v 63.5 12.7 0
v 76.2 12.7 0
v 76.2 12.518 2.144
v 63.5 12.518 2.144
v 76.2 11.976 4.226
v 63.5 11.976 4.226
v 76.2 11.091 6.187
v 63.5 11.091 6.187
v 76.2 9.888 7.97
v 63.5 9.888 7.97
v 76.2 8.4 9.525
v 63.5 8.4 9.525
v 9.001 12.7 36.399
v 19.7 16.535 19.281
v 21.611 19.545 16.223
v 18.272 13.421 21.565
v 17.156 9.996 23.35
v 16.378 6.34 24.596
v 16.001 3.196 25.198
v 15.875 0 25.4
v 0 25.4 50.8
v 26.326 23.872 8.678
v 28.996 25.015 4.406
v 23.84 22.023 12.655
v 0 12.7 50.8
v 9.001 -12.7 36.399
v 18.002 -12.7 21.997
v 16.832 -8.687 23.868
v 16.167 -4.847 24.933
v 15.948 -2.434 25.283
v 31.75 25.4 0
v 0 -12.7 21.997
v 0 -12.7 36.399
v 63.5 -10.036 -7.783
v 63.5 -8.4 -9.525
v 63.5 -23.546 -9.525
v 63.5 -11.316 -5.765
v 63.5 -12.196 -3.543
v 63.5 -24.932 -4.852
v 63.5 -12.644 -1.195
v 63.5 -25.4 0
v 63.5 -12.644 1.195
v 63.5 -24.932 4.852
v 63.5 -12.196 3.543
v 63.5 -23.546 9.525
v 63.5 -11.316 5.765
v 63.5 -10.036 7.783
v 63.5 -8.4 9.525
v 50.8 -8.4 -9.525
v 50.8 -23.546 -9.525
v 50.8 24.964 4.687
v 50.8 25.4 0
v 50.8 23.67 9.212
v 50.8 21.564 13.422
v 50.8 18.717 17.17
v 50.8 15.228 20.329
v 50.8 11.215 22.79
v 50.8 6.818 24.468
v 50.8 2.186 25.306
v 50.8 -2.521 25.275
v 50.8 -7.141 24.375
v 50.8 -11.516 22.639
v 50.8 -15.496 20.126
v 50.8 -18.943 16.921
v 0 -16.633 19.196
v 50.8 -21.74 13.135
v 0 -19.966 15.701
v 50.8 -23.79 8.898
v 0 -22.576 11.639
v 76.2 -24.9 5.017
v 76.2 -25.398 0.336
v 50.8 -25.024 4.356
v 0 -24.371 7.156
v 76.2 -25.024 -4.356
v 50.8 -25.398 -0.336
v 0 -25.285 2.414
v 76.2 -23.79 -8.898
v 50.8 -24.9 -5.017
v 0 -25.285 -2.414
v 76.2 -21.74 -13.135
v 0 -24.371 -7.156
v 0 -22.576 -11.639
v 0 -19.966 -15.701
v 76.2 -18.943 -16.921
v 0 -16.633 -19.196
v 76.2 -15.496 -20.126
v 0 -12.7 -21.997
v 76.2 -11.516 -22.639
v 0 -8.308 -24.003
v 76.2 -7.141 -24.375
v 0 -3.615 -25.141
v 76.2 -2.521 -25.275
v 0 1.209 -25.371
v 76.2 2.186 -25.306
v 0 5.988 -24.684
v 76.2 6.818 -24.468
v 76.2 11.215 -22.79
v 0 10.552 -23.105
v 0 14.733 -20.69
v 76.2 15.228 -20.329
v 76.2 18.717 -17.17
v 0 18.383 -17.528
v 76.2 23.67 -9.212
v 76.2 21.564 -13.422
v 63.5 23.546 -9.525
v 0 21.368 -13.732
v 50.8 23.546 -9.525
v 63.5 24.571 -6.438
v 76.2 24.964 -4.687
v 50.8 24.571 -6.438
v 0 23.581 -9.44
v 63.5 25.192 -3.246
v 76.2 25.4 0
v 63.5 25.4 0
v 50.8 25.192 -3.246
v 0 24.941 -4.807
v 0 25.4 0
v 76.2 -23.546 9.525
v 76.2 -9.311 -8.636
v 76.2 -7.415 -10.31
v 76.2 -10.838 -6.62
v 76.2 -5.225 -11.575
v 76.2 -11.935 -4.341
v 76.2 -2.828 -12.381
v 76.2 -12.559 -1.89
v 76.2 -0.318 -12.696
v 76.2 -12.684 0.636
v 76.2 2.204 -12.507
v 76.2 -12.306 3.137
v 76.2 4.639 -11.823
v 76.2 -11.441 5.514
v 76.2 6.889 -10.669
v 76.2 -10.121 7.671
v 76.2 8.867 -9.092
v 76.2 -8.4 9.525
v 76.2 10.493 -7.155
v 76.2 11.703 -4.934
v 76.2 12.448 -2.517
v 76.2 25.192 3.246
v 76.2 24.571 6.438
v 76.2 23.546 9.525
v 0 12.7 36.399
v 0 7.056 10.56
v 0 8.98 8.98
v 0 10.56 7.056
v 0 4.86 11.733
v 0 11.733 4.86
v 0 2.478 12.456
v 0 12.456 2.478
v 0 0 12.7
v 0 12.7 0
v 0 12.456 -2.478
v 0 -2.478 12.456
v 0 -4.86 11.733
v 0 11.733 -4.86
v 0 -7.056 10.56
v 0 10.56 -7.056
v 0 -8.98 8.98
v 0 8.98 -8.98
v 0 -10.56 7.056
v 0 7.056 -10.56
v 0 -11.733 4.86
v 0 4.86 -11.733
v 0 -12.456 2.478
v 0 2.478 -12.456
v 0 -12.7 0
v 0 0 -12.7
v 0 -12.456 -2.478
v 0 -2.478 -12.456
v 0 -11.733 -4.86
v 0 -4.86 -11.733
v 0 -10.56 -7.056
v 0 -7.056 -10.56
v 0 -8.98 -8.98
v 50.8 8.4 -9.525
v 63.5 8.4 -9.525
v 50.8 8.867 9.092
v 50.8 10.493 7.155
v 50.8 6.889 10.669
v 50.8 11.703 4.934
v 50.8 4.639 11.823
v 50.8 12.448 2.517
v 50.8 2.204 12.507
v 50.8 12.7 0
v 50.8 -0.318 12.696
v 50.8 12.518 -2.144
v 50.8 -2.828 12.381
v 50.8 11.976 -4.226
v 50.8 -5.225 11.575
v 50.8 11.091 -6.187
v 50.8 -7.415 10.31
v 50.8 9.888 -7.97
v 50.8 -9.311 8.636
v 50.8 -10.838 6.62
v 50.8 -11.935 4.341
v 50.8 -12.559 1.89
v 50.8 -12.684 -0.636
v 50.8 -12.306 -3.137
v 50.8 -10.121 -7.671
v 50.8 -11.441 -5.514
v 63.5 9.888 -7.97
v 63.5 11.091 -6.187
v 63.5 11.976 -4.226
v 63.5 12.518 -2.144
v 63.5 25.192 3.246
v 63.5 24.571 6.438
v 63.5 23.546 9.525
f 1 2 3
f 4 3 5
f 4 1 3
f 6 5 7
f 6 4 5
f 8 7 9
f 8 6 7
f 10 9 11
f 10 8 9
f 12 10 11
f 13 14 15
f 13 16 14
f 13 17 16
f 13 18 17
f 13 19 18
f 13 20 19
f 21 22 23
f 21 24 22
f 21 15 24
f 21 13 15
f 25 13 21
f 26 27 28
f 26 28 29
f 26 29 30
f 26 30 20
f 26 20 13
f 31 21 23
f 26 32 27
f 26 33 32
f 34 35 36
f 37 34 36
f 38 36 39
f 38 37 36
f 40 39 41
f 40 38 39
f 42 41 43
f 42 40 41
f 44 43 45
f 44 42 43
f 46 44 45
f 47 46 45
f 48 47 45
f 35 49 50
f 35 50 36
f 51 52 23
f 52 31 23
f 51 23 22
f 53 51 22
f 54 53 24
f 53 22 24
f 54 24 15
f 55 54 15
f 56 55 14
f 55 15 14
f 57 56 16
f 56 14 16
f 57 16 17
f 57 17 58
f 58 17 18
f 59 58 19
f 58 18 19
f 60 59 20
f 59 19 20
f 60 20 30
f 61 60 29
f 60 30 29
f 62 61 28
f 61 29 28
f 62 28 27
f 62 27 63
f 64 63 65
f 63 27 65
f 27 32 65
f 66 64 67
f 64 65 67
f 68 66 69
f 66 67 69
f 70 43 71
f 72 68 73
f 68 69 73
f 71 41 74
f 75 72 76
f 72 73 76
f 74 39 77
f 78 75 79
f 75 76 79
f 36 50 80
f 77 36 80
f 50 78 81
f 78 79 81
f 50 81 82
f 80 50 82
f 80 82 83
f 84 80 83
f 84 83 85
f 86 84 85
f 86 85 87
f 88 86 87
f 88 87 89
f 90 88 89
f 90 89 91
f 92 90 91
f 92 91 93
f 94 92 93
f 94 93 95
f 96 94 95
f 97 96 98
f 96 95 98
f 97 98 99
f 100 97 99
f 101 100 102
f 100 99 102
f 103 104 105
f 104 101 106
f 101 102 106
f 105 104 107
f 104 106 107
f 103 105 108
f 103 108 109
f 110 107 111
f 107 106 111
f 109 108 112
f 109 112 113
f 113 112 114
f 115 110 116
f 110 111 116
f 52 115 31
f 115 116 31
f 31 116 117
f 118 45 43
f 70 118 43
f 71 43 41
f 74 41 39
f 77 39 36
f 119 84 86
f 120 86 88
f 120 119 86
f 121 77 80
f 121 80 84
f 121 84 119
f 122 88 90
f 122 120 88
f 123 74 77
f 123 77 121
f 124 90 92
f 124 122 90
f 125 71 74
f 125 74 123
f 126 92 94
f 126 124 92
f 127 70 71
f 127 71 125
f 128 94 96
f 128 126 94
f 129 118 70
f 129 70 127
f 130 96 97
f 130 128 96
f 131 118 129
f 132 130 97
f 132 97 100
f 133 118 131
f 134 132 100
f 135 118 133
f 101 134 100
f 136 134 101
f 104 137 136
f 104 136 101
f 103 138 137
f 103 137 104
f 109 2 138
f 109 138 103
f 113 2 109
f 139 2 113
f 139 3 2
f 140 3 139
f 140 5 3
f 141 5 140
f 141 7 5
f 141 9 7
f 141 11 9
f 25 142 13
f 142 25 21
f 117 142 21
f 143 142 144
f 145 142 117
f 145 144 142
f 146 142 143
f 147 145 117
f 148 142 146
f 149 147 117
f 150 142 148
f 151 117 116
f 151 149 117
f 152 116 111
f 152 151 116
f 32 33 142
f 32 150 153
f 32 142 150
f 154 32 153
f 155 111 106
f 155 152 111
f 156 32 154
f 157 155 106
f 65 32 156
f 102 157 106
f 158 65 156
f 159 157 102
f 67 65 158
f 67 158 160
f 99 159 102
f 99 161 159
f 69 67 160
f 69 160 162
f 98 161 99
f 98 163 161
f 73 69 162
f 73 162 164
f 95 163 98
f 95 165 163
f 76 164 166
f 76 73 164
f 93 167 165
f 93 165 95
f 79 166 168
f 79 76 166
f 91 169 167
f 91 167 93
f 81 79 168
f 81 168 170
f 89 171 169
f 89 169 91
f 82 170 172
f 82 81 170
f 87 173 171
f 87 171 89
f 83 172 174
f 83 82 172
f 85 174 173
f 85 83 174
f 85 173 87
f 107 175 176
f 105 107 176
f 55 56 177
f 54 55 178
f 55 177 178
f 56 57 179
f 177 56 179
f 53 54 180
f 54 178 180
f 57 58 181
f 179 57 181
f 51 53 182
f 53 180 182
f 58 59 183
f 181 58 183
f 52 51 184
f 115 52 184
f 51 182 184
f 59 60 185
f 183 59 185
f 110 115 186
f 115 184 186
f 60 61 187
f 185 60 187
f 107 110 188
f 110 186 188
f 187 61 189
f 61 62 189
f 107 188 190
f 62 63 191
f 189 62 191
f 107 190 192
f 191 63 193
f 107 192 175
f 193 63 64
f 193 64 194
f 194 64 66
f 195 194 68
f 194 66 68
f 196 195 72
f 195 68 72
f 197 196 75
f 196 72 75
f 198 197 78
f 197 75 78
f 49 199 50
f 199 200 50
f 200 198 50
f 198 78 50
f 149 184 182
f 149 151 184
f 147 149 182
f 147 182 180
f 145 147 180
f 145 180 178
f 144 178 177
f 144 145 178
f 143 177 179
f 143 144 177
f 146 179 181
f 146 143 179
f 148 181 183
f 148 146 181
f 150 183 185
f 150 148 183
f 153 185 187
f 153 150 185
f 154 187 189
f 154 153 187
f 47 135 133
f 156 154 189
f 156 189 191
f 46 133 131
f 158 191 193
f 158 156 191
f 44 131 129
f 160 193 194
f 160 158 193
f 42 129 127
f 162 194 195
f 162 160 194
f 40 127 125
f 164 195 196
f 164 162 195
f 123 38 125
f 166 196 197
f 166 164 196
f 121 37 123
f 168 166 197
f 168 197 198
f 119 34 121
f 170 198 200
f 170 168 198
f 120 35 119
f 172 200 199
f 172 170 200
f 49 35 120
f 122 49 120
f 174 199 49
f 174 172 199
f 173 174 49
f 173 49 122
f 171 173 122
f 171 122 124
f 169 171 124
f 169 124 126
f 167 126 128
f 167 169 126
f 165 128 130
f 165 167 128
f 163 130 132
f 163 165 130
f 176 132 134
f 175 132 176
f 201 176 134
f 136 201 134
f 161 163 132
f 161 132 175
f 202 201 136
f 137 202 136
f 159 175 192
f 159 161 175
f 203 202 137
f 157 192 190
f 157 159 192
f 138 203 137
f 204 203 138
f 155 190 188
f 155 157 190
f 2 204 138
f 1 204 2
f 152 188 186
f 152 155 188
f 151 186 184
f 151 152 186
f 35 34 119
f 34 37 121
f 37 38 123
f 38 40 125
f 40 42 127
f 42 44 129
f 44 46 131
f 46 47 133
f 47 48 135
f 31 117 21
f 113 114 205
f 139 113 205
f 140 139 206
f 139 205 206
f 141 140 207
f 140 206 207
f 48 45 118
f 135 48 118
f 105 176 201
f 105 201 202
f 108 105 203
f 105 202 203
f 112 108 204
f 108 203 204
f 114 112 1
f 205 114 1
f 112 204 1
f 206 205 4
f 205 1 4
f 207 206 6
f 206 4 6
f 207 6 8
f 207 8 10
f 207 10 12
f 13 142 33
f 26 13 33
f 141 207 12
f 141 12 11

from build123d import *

# Parameters (mm, degrees)
F0_R          = 25.4
F0_R_2        = 12.7
F1_DEPTH      = 76.2
F3_DEPTH      = 25.401
F3_DEPTH_BACK = 25.4
F5_DEPTH      = 25.4
F5_DEPTH_BACK = 12.7
F6_W          = 25.4
F6_H          = 14.4014773719
F7_DEPTH      = 76.201
F8_DEPTH      = 76.201


with BuildPart() as f1:
    # F0 (on Right) → F1 (new body)
    with BuildSketch(Plane.YZ):
        Circle(F0_R)
        Circle(F0_R_2, mode=Mode.SUBTRACT)
    extrude(amount=F1_DEPTH)

    # F2 (on Front) → F3 (cut, two sides)
    with BuildSketch(Plane.XZ) as f3_sk:
        Polygon((76.2, 25.4), (50.8, 25.4), (50.8, -9.525), (63.5, -9.525), (63.5, 9.525), (76.2, 9.525), align=None)
    extrude(amount=-F3_DEPTH, mode=Mode.SUBTRACT)
    extrude(f3_sk.sketch, amount=F3_DEPTH_BACK, mode=Mode.SUBTRACT)

    # F4 (on Front) → F5 (join, two sides)
    with BuildSketch(Plane.XZ) as f5_sk:
        Polygon((31.75, 0), (0, 50.8), (0, 0), align=None)
    extrude(amount=-F5_DEPTH)
    extrude(f5_sk.sketch, amount=F5_DEPTH_BACK)

    # F6 (on face) → F7 (cut, through all)
    with BuildSketch(Plane(origin=(0, 0, 0), x_dir=(0, -1, 0), z_dir=(-1, 0, 0))):
        with Locations((0, 43.599261314)):
            Rectangle(F6_W, F6_H)
    extrude(amount=-F7_DEPTH, mode=Mode.SUBTRACT)

    # F0 (on Right) → F8 (cut, through all)
    with BuildSketch(Plane.YZ):
        Circle(F0_R_2)
    extrude(amount=F8_DEPTH, mode=Mode.SUBTRACT)


solid = f1.part
